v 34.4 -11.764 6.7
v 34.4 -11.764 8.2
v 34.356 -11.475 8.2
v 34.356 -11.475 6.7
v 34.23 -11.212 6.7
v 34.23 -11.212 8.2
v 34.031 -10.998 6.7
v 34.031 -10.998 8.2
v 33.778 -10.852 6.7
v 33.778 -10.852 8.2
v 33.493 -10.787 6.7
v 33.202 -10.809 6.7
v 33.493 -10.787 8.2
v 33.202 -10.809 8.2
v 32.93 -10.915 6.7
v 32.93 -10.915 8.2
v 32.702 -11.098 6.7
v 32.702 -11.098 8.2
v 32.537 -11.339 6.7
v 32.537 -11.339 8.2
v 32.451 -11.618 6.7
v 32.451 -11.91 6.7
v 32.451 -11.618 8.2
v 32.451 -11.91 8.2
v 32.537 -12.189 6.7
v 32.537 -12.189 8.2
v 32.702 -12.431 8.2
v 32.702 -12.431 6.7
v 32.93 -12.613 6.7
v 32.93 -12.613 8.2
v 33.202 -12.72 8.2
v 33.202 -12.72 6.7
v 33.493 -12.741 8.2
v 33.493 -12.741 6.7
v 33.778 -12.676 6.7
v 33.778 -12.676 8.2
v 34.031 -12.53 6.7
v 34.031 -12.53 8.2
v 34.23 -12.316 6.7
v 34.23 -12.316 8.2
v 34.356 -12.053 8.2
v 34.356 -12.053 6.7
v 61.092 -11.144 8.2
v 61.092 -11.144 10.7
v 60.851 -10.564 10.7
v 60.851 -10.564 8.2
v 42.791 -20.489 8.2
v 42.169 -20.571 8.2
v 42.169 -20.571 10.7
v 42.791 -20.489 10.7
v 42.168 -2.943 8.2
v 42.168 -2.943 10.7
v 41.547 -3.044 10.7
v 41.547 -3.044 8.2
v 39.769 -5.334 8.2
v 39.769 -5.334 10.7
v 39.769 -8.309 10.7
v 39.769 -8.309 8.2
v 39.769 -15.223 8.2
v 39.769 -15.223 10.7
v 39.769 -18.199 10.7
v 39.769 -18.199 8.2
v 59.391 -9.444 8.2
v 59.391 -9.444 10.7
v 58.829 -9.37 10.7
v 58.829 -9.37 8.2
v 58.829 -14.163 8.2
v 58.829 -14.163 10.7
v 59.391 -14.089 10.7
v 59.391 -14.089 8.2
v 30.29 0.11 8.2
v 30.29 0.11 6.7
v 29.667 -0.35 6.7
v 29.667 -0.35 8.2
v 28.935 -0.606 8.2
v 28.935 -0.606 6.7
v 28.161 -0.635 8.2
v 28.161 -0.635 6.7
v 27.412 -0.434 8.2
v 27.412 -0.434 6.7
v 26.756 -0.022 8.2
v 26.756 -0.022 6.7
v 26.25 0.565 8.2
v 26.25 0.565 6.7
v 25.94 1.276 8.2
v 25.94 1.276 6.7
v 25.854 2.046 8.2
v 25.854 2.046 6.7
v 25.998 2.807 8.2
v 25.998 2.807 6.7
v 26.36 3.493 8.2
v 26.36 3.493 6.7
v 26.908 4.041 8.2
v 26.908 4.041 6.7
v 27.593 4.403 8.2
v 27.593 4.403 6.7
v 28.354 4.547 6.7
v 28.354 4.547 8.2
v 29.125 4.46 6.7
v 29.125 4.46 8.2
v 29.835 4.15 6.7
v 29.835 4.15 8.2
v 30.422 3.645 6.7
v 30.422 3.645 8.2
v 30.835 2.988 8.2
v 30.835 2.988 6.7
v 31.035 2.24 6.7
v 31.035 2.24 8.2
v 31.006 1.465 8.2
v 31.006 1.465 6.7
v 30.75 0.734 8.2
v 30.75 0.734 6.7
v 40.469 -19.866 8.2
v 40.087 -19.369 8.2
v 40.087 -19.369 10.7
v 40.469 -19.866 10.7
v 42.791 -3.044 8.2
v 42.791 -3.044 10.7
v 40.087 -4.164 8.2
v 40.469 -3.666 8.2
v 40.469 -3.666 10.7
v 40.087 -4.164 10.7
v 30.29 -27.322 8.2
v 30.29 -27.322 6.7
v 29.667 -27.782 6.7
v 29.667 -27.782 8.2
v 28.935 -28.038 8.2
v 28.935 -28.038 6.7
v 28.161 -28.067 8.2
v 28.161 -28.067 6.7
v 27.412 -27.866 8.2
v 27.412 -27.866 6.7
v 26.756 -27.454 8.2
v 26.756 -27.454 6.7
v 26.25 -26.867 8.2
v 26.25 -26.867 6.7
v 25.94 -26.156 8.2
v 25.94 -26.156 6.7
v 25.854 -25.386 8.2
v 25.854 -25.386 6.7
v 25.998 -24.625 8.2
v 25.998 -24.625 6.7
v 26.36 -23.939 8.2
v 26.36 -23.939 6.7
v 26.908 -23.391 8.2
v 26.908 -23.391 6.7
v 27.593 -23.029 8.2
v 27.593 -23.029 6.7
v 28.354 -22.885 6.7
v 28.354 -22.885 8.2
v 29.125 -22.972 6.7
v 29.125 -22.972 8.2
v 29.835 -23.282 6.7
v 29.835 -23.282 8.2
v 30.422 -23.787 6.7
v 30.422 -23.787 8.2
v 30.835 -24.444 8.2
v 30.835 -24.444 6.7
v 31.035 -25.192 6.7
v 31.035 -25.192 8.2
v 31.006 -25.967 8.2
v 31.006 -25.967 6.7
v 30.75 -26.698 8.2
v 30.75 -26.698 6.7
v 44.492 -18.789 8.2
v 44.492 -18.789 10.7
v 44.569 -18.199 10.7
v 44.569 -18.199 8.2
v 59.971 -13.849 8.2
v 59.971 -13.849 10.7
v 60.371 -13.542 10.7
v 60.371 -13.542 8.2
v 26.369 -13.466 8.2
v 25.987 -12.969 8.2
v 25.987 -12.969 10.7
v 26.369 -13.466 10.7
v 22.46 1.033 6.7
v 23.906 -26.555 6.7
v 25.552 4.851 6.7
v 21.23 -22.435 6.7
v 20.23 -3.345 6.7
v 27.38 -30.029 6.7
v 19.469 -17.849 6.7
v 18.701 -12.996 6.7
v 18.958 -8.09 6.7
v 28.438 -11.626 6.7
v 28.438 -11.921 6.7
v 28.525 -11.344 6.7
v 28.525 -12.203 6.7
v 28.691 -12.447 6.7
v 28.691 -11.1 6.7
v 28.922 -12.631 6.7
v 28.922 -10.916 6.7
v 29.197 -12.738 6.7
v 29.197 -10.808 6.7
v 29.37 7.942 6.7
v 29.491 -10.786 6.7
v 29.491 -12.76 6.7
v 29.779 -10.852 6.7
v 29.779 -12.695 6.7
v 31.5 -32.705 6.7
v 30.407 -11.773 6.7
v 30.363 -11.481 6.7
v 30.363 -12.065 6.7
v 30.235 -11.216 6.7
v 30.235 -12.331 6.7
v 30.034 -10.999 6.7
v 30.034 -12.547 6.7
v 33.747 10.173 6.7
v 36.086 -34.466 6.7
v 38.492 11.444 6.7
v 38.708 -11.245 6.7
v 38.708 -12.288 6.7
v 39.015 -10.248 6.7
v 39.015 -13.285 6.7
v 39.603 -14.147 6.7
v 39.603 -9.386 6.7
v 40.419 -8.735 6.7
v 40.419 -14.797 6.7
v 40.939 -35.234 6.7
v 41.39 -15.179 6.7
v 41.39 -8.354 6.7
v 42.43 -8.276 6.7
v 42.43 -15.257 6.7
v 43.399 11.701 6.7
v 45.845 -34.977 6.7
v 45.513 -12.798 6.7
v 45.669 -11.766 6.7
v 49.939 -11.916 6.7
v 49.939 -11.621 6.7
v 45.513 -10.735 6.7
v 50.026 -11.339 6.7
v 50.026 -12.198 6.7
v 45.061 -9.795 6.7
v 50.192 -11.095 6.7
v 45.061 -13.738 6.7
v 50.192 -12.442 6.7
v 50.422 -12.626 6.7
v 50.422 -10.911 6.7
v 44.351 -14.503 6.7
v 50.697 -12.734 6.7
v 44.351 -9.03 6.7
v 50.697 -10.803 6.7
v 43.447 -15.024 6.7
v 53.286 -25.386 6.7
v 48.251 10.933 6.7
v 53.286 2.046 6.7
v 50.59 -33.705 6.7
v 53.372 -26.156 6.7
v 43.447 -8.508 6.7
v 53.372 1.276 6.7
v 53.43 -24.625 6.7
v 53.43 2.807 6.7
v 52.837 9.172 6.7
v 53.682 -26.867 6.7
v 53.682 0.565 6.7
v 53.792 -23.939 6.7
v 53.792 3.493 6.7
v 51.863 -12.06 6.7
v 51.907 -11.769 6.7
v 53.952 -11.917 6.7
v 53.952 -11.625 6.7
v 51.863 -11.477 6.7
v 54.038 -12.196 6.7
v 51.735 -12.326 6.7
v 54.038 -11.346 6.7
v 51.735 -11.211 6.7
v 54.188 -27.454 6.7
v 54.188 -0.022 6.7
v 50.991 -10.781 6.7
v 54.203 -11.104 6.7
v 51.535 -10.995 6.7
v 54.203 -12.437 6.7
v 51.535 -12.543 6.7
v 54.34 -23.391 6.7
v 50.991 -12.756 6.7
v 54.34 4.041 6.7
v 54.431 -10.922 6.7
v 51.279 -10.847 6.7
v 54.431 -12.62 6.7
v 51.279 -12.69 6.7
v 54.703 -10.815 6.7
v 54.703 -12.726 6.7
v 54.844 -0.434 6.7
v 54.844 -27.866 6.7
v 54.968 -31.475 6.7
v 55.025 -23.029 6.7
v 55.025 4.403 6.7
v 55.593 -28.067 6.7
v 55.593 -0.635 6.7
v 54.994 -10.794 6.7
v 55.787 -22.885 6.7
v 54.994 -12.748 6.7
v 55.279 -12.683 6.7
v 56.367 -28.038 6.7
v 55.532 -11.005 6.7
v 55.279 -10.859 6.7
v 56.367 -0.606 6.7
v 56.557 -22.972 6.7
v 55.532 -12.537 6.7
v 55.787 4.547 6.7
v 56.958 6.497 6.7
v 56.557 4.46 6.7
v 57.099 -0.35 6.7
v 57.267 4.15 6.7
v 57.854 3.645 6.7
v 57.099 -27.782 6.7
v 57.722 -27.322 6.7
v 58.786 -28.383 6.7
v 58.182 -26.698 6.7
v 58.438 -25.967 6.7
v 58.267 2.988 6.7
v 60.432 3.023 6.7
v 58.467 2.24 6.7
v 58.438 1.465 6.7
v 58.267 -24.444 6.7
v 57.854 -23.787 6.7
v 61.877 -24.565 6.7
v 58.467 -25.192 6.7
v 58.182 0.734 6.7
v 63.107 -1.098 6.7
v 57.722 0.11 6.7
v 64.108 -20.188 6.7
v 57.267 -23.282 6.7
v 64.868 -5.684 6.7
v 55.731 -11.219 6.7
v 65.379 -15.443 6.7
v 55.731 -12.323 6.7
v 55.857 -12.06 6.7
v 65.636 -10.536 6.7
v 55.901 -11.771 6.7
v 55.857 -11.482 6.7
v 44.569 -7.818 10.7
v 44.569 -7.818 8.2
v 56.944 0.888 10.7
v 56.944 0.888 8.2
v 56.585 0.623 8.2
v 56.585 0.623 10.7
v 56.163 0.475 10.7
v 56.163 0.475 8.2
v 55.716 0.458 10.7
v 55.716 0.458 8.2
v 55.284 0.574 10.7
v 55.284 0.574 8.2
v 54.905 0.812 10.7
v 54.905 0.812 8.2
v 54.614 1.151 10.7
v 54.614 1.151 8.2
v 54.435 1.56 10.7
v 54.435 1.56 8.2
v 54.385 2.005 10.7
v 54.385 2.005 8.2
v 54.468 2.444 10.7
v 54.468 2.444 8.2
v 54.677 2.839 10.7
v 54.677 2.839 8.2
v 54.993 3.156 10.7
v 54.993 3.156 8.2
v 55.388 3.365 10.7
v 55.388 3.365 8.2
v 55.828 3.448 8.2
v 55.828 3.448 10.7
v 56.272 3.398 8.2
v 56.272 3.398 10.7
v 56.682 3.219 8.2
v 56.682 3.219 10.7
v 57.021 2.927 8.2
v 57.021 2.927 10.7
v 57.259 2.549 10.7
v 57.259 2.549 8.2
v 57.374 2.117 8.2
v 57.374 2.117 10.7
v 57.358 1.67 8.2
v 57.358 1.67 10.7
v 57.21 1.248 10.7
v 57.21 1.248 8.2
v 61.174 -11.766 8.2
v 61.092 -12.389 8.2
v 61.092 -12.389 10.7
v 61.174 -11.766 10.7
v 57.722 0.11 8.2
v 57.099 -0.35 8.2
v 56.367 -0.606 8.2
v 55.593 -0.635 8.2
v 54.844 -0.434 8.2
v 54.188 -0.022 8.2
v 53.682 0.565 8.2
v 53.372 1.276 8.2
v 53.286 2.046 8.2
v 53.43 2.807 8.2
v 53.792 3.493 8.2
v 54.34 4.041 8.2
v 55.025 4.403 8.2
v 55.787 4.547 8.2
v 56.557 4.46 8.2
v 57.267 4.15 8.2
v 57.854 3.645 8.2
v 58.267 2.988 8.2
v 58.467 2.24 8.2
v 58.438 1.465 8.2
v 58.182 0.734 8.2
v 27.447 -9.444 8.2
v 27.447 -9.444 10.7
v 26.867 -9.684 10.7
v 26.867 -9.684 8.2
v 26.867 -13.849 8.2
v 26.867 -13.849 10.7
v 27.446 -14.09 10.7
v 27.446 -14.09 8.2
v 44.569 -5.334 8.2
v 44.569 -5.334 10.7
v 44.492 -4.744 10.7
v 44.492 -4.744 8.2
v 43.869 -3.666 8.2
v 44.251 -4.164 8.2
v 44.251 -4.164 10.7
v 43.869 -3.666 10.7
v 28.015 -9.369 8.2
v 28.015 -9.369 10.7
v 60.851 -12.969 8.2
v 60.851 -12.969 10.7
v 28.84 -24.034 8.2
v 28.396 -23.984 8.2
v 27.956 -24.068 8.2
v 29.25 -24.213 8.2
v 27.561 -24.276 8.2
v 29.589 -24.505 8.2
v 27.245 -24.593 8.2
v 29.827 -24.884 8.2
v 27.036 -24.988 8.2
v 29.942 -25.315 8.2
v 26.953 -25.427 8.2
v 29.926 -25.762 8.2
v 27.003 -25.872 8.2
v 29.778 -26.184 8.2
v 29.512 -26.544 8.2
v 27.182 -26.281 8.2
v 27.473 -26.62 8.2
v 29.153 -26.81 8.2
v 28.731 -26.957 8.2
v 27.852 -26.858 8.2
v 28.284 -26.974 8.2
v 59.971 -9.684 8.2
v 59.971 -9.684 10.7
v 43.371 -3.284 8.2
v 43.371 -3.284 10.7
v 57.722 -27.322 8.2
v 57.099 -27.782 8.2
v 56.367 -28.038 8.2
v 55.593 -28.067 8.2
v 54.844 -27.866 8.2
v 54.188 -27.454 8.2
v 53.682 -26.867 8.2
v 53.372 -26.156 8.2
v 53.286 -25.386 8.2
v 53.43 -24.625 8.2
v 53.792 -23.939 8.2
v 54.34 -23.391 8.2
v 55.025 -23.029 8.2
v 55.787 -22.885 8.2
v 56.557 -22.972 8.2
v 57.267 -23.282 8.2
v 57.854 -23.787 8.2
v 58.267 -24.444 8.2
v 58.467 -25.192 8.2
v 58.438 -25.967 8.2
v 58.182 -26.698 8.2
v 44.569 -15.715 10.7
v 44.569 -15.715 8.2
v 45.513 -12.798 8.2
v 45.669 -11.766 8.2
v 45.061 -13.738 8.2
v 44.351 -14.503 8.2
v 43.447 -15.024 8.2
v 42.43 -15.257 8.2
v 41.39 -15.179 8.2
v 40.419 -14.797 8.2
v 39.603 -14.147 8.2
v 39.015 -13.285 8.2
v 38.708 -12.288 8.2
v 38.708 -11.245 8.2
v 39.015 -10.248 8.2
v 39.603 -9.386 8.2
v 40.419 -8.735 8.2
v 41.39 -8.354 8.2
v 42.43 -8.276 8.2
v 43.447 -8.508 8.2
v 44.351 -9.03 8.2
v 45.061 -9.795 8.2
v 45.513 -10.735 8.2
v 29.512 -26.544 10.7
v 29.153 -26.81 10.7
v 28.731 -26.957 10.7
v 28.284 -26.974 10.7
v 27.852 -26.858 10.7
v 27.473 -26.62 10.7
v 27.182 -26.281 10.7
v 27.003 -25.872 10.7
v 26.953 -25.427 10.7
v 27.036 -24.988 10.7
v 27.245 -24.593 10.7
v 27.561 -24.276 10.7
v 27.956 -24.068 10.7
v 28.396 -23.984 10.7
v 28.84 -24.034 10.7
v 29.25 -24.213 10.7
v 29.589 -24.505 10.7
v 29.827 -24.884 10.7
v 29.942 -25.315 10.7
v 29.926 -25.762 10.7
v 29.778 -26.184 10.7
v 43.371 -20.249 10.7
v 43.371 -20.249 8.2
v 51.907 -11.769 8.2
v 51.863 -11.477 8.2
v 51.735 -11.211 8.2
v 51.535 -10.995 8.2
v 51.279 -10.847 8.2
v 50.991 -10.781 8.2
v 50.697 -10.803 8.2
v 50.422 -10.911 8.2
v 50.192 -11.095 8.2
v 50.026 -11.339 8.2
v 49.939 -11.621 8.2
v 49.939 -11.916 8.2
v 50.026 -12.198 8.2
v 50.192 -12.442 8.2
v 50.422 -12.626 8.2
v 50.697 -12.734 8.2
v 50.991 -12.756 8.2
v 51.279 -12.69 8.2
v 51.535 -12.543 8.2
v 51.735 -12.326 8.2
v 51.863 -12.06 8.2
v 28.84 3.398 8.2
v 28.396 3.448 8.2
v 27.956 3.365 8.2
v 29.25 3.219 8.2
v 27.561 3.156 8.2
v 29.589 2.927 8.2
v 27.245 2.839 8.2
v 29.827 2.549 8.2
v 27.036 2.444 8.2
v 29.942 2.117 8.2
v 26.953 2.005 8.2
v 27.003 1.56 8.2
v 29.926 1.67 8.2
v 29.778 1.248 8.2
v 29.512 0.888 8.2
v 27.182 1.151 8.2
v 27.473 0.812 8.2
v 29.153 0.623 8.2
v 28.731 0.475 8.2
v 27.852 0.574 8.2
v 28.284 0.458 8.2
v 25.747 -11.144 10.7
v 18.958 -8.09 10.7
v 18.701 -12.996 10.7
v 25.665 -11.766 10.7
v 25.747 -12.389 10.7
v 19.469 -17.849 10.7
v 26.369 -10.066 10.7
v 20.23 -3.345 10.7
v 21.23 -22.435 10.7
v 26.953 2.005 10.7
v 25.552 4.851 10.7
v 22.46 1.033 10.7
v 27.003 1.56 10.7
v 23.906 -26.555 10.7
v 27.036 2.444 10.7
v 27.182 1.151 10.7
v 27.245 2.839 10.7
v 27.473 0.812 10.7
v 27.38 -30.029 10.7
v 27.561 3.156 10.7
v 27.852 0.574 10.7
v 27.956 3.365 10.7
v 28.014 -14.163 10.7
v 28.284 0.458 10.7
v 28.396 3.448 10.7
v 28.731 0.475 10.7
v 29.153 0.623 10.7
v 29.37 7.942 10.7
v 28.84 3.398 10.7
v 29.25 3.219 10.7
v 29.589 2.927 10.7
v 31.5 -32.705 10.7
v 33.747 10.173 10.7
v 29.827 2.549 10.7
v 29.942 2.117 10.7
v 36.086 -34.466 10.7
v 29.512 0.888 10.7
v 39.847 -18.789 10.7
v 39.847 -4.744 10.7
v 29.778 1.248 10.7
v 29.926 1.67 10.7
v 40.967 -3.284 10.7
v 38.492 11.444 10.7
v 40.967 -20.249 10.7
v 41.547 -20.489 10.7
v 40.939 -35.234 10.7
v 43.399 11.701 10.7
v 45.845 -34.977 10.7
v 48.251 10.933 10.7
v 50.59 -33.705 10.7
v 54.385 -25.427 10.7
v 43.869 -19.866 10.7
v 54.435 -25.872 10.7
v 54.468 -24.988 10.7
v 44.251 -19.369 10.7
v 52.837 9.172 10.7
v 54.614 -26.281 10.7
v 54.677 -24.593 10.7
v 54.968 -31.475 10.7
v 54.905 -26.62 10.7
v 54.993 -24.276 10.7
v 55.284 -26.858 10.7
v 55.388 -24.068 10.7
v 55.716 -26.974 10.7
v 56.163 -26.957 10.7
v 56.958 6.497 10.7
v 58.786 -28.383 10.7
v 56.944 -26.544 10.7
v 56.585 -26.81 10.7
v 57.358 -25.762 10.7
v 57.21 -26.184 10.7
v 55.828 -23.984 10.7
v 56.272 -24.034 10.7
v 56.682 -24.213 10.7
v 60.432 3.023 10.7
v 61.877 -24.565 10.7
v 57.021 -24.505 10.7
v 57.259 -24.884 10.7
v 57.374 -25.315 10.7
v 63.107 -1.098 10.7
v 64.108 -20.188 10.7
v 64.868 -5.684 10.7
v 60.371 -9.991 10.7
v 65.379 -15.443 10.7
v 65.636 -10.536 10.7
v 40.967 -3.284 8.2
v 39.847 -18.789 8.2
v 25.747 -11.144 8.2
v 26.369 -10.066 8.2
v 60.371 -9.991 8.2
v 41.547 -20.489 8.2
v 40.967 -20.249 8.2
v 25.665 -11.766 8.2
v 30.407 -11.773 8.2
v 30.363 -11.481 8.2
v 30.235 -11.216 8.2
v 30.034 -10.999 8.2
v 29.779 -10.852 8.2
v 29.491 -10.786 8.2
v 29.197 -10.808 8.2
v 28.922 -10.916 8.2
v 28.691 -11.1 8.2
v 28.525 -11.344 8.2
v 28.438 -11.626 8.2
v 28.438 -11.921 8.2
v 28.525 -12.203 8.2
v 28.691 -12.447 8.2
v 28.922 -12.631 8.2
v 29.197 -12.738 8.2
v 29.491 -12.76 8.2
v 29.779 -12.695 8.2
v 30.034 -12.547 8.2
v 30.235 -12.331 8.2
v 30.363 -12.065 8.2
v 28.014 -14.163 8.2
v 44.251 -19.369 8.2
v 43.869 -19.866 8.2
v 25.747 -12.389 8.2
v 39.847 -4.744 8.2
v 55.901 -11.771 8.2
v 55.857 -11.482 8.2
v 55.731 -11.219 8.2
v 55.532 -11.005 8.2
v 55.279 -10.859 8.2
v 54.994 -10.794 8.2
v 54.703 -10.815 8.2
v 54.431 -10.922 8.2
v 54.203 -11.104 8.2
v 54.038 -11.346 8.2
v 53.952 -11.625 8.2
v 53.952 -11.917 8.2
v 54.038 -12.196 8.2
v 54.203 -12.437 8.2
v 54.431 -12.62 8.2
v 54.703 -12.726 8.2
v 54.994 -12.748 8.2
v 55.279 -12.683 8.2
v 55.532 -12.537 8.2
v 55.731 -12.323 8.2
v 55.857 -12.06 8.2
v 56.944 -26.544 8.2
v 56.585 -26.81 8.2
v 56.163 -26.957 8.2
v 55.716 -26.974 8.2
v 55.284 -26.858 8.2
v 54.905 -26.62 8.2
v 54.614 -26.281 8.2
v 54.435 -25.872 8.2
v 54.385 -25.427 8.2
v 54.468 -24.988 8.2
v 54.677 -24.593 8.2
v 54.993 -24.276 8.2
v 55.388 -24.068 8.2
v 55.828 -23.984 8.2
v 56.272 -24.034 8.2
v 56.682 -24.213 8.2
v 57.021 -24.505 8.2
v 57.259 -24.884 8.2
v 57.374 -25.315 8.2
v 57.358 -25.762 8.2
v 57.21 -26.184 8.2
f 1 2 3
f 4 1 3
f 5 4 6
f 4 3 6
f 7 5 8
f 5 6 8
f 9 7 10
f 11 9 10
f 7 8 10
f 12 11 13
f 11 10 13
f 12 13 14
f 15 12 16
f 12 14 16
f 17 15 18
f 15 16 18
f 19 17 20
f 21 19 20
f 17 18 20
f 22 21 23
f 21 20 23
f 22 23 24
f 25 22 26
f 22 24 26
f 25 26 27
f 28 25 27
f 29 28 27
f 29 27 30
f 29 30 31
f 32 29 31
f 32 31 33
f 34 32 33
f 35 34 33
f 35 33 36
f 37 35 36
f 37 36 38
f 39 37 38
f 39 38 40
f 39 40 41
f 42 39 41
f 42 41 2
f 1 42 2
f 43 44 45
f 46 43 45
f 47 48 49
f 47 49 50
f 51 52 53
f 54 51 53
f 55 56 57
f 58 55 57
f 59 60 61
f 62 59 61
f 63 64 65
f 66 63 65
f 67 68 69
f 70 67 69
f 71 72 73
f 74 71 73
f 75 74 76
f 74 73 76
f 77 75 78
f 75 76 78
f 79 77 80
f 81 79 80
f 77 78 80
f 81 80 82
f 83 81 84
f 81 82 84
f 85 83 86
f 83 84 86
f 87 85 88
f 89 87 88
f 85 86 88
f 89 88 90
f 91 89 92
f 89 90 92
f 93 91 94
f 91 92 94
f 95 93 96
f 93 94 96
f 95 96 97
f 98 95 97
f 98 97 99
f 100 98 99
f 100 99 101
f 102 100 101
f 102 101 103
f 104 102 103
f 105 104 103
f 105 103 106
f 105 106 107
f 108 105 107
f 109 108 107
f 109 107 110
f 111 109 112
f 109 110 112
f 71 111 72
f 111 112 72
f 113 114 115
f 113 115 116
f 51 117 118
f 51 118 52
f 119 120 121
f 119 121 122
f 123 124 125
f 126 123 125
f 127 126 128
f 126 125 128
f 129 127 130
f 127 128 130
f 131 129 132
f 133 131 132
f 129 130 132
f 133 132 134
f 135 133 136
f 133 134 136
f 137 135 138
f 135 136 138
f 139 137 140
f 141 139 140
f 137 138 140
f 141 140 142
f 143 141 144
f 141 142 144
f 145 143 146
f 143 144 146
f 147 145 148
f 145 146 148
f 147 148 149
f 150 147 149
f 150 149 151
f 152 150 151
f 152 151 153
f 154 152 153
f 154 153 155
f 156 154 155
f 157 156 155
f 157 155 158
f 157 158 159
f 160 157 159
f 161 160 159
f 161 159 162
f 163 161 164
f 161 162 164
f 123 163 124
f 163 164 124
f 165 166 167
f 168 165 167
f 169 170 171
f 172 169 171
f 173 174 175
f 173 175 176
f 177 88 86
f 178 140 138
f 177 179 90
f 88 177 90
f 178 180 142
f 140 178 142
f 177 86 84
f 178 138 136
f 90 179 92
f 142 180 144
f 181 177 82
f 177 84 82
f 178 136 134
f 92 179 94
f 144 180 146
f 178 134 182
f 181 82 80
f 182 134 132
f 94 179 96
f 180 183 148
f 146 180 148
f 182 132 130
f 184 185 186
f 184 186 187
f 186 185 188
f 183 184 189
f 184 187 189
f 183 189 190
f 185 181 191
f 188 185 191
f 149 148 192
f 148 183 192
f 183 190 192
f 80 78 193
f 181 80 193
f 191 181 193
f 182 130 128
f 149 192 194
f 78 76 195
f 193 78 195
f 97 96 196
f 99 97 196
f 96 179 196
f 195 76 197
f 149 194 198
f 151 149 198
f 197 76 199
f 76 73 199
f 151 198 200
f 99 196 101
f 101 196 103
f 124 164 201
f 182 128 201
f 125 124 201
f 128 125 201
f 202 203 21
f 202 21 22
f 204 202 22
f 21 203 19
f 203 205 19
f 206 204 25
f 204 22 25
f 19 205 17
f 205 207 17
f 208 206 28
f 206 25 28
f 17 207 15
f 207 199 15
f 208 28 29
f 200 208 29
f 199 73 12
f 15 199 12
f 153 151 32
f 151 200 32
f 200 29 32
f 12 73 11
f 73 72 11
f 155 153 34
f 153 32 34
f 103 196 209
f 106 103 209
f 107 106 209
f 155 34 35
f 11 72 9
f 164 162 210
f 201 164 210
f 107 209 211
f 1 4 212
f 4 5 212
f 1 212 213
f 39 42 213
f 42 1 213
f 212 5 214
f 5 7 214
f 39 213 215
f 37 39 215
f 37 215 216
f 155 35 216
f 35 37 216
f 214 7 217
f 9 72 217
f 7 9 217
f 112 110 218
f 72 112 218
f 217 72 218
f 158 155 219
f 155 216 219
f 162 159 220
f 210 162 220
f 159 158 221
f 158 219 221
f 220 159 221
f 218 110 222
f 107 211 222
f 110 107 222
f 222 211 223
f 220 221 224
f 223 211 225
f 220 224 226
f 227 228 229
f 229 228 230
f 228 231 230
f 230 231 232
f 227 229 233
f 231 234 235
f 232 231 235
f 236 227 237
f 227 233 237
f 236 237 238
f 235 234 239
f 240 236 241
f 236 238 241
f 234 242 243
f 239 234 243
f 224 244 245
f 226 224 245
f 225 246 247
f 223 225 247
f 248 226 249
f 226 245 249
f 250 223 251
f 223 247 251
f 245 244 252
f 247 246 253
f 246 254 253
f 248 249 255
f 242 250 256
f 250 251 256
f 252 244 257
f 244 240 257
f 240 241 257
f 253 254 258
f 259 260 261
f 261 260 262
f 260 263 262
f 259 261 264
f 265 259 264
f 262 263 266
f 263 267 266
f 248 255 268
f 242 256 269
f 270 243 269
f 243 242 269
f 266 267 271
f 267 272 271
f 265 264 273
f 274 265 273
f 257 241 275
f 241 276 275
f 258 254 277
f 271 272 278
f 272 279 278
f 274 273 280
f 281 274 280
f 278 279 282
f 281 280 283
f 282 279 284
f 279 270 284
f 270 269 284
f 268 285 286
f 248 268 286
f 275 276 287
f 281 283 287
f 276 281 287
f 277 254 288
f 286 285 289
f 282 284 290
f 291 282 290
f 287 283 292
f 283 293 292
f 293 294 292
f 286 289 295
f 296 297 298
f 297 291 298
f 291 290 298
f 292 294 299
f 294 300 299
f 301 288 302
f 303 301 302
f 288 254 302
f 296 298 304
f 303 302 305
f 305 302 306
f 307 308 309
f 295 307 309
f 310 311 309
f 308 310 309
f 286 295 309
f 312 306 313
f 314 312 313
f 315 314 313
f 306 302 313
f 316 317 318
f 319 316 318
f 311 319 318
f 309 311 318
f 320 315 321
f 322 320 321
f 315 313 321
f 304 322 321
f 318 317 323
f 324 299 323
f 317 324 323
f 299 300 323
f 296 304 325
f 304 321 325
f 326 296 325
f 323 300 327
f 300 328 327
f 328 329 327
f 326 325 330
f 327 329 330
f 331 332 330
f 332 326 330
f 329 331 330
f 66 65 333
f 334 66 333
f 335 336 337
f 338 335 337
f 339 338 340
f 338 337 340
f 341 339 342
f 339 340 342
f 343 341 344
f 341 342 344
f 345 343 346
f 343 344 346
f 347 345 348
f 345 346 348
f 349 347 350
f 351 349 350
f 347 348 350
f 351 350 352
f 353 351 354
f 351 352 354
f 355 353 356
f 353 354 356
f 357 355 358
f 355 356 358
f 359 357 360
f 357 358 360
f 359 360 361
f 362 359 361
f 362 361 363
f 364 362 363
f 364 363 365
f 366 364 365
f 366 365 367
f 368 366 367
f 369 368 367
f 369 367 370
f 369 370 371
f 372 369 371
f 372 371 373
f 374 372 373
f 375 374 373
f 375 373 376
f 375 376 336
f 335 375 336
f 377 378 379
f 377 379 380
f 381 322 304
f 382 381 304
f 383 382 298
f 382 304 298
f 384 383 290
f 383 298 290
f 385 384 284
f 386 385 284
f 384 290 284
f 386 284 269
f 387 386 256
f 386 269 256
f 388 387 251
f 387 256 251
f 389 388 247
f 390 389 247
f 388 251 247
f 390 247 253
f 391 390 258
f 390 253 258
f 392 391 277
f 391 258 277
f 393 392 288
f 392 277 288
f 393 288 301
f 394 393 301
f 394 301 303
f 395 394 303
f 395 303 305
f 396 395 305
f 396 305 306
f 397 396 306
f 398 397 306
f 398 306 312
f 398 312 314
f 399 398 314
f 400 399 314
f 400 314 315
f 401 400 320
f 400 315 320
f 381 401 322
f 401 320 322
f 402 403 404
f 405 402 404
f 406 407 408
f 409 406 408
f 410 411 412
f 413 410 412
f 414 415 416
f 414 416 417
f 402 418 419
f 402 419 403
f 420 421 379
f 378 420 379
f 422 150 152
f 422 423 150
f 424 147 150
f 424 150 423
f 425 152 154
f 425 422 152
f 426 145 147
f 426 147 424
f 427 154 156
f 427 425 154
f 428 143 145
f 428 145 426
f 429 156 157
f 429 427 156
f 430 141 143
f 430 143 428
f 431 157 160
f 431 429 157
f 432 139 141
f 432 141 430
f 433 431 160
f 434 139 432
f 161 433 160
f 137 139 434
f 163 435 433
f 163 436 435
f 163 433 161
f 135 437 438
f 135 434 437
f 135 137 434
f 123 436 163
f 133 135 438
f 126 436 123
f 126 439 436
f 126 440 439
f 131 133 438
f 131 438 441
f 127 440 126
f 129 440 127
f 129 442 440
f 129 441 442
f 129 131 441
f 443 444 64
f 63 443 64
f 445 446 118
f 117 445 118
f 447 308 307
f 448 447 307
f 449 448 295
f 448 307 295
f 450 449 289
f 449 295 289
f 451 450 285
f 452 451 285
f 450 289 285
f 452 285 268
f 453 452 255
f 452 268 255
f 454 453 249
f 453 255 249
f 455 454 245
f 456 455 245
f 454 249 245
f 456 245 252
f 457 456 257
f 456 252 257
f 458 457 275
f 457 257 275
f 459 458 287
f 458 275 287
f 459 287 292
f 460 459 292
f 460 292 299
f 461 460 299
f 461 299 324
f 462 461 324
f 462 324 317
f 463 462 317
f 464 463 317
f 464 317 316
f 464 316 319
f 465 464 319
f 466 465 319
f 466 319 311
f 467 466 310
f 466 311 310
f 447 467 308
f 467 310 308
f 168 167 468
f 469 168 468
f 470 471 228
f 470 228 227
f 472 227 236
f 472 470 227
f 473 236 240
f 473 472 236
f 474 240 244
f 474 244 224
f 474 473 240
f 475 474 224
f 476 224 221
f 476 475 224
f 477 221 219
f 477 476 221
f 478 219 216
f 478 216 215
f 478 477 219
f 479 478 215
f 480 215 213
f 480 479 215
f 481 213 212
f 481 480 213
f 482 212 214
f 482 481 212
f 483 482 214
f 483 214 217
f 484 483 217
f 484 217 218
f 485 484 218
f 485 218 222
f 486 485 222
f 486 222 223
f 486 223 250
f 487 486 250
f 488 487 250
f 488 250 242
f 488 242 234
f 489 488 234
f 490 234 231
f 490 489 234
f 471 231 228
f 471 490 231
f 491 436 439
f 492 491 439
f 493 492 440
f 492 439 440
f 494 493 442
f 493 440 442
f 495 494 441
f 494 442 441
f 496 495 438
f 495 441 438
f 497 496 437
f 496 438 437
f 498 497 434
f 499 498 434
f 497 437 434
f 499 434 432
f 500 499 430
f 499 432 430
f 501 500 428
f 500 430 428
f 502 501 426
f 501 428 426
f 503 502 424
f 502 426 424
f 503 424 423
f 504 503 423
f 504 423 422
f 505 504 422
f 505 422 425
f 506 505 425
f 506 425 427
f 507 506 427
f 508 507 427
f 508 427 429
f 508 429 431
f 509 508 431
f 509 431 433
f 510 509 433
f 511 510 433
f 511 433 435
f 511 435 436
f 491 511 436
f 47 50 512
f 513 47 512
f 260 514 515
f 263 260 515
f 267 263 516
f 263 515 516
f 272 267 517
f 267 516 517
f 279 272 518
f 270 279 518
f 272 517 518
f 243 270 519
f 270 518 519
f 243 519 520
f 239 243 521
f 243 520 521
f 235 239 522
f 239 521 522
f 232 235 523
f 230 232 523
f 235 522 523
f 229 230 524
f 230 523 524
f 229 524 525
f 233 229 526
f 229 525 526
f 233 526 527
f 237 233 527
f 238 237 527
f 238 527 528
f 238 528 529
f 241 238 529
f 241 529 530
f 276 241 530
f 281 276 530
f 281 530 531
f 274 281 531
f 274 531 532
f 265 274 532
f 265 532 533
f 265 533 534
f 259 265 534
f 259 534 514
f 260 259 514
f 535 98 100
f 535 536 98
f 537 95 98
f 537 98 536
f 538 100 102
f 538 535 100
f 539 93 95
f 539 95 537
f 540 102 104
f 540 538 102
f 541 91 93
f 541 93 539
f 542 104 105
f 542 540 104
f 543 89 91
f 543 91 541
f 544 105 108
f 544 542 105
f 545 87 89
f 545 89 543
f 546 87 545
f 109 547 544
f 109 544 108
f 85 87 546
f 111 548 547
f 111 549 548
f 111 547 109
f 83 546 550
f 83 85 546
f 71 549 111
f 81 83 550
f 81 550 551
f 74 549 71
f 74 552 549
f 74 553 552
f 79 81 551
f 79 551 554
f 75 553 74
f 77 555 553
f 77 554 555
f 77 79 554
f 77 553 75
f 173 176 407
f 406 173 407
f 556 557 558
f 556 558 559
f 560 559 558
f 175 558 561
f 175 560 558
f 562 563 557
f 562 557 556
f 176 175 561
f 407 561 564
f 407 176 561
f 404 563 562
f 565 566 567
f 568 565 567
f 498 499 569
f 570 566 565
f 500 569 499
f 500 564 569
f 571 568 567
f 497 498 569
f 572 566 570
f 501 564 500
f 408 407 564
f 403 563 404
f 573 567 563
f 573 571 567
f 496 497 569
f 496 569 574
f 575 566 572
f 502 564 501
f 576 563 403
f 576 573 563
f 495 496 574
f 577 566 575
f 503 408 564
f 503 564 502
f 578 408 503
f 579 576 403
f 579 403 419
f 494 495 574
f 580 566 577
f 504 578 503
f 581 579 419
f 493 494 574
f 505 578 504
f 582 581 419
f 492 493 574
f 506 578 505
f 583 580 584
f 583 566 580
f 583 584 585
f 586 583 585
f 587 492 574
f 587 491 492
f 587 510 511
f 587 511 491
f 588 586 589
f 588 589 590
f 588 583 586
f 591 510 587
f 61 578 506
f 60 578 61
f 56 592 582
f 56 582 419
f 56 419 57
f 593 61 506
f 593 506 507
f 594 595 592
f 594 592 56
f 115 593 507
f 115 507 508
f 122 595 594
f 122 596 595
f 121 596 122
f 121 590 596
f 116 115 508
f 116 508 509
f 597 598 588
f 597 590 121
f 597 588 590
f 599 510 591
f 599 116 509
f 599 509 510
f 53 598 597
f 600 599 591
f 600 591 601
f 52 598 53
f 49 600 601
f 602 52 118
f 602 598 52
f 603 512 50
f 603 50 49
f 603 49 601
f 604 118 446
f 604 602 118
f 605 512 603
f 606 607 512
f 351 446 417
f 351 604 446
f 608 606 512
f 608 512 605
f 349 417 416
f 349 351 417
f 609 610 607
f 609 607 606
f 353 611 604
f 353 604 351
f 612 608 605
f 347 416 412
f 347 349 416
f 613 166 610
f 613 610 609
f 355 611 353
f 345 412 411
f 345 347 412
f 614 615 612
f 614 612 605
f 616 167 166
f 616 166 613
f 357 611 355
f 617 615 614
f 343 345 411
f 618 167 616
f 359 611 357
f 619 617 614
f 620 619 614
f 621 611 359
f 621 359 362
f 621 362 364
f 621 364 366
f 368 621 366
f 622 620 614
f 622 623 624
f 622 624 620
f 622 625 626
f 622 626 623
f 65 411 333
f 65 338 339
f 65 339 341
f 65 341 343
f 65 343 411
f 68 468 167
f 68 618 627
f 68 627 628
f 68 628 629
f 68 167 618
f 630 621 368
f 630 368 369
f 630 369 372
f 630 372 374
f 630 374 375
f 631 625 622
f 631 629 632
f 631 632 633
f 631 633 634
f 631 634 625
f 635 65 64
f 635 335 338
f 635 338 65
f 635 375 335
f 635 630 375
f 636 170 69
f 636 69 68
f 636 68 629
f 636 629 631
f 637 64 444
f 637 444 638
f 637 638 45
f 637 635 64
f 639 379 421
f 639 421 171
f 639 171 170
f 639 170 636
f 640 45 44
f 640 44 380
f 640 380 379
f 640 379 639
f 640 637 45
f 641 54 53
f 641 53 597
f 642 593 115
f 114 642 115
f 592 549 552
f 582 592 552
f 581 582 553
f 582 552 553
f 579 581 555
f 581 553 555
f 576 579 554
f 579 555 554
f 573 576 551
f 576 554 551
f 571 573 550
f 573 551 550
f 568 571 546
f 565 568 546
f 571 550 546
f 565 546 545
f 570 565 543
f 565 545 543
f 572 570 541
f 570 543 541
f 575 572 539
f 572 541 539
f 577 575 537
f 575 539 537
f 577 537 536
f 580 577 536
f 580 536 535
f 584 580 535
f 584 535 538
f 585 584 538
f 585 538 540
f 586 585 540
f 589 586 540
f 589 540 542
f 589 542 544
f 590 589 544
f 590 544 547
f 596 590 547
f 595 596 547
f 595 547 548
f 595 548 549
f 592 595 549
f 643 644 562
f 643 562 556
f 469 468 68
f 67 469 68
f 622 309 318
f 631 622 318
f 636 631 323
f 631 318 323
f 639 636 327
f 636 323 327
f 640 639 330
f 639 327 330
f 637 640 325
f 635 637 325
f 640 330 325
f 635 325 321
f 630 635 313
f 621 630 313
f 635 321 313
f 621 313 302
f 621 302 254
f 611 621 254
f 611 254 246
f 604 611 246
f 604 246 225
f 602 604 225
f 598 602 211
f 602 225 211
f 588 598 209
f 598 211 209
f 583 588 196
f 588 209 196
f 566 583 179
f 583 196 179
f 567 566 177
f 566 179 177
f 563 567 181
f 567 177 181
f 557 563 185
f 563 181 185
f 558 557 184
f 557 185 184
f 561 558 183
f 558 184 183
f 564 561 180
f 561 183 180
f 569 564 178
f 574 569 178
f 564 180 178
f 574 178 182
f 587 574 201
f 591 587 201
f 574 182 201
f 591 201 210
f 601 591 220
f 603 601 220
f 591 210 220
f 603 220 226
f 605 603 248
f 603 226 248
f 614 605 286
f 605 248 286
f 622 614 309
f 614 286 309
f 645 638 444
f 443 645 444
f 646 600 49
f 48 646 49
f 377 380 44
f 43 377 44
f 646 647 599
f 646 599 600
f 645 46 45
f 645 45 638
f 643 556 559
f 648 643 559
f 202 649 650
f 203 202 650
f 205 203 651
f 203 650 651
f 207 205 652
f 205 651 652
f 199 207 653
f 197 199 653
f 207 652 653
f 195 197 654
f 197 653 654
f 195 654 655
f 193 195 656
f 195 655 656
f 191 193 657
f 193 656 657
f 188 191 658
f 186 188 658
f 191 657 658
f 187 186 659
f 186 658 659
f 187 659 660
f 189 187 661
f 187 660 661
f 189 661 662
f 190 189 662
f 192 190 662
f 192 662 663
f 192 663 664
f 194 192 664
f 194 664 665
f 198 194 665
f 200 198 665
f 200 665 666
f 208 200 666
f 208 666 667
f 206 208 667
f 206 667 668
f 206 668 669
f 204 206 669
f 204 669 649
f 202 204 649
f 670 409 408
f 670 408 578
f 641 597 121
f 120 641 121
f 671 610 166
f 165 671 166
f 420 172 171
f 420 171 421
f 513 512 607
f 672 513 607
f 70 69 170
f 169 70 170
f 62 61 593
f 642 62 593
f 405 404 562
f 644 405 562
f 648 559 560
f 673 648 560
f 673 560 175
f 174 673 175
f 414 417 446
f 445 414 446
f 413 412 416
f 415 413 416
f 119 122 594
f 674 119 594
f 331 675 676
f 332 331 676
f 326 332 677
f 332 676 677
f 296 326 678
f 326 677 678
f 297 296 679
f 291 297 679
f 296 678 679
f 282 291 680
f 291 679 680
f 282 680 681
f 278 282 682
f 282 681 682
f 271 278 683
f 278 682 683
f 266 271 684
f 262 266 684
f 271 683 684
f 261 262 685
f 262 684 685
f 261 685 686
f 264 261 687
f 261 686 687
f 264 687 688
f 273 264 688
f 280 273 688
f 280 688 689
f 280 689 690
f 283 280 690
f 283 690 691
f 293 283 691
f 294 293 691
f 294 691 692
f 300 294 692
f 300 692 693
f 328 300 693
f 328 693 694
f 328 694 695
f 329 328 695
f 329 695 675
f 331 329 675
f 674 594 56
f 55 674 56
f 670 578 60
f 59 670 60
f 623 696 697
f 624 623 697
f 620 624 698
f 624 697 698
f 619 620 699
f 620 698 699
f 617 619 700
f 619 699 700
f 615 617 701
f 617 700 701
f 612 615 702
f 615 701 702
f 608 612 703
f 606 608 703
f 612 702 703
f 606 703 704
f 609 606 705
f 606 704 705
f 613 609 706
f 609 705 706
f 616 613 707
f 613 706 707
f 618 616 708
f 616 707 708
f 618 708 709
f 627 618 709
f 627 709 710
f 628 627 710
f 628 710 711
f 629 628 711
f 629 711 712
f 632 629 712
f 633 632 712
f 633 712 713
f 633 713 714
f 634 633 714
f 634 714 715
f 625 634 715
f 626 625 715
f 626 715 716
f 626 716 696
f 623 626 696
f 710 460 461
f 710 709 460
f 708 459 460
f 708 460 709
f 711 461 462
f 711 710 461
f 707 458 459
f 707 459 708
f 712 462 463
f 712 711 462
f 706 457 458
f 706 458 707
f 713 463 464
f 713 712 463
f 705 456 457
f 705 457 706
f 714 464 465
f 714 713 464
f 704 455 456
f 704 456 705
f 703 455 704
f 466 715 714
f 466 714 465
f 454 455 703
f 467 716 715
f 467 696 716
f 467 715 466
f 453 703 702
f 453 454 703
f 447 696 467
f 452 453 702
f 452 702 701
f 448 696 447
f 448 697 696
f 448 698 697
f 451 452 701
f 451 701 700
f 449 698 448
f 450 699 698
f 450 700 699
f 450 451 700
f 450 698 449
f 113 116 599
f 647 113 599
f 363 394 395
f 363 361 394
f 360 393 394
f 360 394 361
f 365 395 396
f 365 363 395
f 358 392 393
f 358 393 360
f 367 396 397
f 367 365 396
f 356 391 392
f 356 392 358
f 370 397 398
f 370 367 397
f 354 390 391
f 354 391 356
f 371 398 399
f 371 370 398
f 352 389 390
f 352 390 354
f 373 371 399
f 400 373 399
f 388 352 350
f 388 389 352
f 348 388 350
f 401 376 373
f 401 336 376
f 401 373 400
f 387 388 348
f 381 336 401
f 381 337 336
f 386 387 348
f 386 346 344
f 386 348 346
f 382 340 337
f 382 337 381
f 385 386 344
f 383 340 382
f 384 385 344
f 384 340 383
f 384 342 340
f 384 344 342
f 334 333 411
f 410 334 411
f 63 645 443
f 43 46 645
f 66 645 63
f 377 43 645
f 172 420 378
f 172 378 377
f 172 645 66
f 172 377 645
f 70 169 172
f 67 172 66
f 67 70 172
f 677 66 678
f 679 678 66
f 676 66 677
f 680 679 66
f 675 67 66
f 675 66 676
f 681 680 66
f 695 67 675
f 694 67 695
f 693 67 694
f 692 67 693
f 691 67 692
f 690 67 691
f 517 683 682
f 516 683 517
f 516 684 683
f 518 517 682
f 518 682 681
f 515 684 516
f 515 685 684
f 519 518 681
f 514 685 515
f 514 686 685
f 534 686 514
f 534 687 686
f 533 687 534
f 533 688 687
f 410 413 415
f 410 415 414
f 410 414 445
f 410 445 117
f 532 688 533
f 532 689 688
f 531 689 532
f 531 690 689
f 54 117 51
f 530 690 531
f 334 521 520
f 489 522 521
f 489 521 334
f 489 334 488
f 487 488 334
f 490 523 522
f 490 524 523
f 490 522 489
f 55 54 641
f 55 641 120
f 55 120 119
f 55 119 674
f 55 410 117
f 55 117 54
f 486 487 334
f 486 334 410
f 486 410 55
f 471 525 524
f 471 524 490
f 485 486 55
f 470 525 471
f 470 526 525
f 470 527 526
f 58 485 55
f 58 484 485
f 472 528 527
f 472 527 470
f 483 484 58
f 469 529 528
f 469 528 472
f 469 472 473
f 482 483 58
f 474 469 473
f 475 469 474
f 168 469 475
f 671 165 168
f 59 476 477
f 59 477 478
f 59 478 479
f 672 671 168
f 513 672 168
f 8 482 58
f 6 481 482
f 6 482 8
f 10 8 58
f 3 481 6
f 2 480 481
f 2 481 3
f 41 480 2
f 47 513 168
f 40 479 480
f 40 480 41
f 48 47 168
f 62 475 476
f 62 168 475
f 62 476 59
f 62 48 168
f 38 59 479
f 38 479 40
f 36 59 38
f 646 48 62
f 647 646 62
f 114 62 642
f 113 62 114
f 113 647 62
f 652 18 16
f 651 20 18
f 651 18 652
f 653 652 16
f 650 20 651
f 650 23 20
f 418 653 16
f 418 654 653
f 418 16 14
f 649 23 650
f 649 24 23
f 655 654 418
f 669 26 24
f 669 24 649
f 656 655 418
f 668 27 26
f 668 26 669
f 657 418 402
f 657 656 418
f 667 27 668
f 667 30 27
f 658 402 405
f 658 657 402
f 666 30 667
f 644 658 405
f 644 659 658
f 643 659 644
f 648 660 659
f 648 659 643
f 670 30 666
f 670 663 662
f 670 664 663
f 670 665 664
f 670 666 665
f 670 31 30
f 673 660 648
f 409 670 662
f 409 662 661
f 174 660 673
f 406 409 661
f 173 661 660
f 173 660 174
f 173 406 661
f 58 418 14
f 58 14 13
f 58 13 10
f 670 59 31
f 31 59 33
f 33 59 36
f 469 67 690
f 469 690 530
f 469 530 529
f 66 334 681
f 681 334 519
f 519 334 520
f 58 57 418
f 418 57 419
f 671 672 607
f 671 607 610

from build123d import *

# Parameters (mm, degrees)
CIRCLE001_R            = 0.99
EXTRUDE060_DEPTH       = 4
CIRCLE002_R            = 0.98
EXTRUDE059_DEPTH       = 4
CIRCLE003_R            = 0.99
EXTRUDE058_DEPTH       = 4
CIRCLE004_R            = 0.98
EXTRUDE057_DEPTH       = 4
CIRCLE051_R            = 3.5
EXTRUDE056_DEPTH       = 1.5
EXTRUDE055_DEPTH       = 2.5
CIRCLE049_R            = 2.6
EXTRUDE052_DEPTH       = 1.5
CIRCLE048_R            = 2.6
EXTRUDE051_DEPTH       = 1.5
CIRCLE047_R            = 2.6
EXTRUDE050_DEPTH       = 1.5
CIRCLE050_R            = 2.6
EXTRUDE049_DEPTH       = 1.5
CIRCLE045_R            = 1.5
EXTRUDE045_DEPTH       = 4
CIRCLE043_R            = 1.5
EXTRUDE046_DEPTH       = 4
CIRCLE046_R            = 1.5
EXTRUDE047_DEPTH       = 4
CIRCLE044_R            = 1.5
EXTRUDE048_DEPTH       = 4
CIRCLE040_R            = 23.5
EXTRUDE044_DEPTH       = 4
CUT015_PLACEMENT_ANGLE = 45
CUT018_PLACEMENT_ANGLE = 180


with BuildPart() as extrude060:
    # Circle001 → Extrude060 (new body)
    with BuildSketch(Plane(origin=(100.138196, 1.761986, -7), x_dir=(1, 0, 0), z_dir=(0, 0, -1))):
        Circle(CIRCLE001_R)
    extrude(amount=-EXTRUDE060_DEPTH)


with BuildPart() as extrude059:
    # Circle002 (on Circle) → Extrude059 (new body)
    with BuildSketch(Plane(origin=(104.140973, 1.752854, -7), x_dir=(1, 0, 0), z_dir=(0, 0, -1))):
        Circle(CIRCLE002_R)
    extrude(amount=-EXTRUDE059_DEPTH)


with BuildPart() as extrude058:
    # Circle003 (on Circle) → Extrude058 (new body)
    with BuildSketch(Plane(origin=(121.638501, 1.757256, -7), x_dir=(1, 0, 0), z_dir=(0, 0, -1))):
        Circle(CIRCLE003_R)
    extrude(amount=-EXTRUDE058_DEPTH)


with BuildPart() as extrude057:
    # Circle004 → Extrude057 (new body)
    with BuildSketch(Plane(origin=(125.641919, 1.759529, -7), x_dir=(1, 0, 0), z_dir=(0, 0, -1))):
        Circle(CIRCLE004_R)
    extrude(amount=-EXTRUDE057_DEPTH)


with BuildPart() as extrude056:
    # Circle051 → Extrude056 (new body)
    with BuildSketch(Plane(origin=(115.082764, -1.512482, 32.5), x_dir=(1, 0, 0), z_dir=(0, 0, 1))):
        Circle(CIRCLE051_R)
    extrude(amount=EXTRUDE056_DEPTH)


with BuildPart() as fusion016:
    # Wire001 → Extrude055 (new body)
    with BuildSketch(Plane(origin=(418.588715, 55.5117, 32.5), x_dir=(1, 0, 0), z_dir=(0, 0, 1))):
        Polygon((0, 0), (-11.754715, 1.0599), (-12.322327, 1.134499), (-12.902222, 1.374699), (-13.400116, 1.756802), (-14.0224, 2.834702), (-14.104401, 3.456902), (-14.0224, 4.079201), (-13.782227, 4.6591), (-13.400116, 5.157001), (-12.902283, 5.539154), (-12.322998, 5.780178), (-11.755127, 5.854), (0, 6.913898), (0, 9.889698), (0.077576, 10.479198), (0.31778, 11.059101), (0.69989, 11.557003), (1.197784, 11.939098), (1.777679, 12.179302), (2.399994, 12.261303), (3.022186, 12.179302), (3.602081, 11.939098), (4.100098, 11.557003), (4.482178, 11.059101), (4.722382, 10.479198), (4.799988, 9.889698), (4.799988, 7.405499), (19.059692, 5.853401), (19.622192, 5.779301), (20.202087, 5.539101), (20.601379, 5.2327), (21.082184, 4.6591), (21.322388, 4.079201), (21.404297, 3.456902), (21.322388, 2.834702), (21.082184, 2.254799), (20.601379, 1.681099), (20.202087, 1.374699), (19.622192, 1.134499), (19.059692, 1.060501), (4.799988, -0.4916), (4.799988, -2.9758), (4.722382, -3.5653), (4.482178, -4.145199), (4.100098, -4.6432), (3.602081, -5.025299), (3.022186, -5.265499), (2.398834, -5.366161), (1.777679, -5.265499), (1.197784, -5.025299), (0.69989, -4.6432), (0.31778, -4.145199), (0.077576, -3.5653), (0, -2.9758), align=None)
    extrude(amount=EXTRUDE055_DEPTH)


with BuildPart() as fusion016_1:
    # Extrude055 placement: moved
    add(fusion016.part.moved(Location((-305.905368, -60.481077, -2.5))))

    # Fusion015: union Extrude056
    add(extrude056.part)


with BuildPart() as fusion016_2:
    # Fusion015 placement: moved
    add(fusion016_1.part.moved(Location((-2.193024, 3.267531, -37))))

    # Fusion016: union Extrude060, Extrude059, Extrude058, Extrude057
    add(extrude060.part)
    add(extrude059.part)
    add(extrude058.part)
    add(extrude057.part)


with BuildPart() as fusion016_3:
    # Fusion016 placement: moved
    add(fusion016_2.part.moved(Location((-42.889772, -1.655092, 0))))


with BuildPart() as extrude052:
    # Circle049 → Extrude052 (new body)
    with BuildSketch(Plane(origin=(70, -19.29598, -3), x_dir=(1, 0, 0), z_dir=(0, 0, 1))):
        Circle(CIRCLE049_R)
    extrude(amount=-EXTRUDE052_DEPTH)


with BuildPart() as extrude051:
    # Circle048 → Extrude051 (new body)
    with BuildSketch(Plane(origin=(89.397382, 0.101403, -3), x_dir=(1, 0, 0), z_dir=(0, 0, 1))):
        Circle(CIRCLE048_R)
    extrude(amount=-EXTRUDE051_DEPTH)


with BuildPart() as extrude050:
    # Circle047 (on Cut) → Extrude050 (new body)
    with BuildSketch(Plane(origin=(70, 19.498785, -3), x_dir=(1, 0, 0), z_dir=(0, 0, 1))):
        Circle(CIRCLE047_R)
    extrude(amount=-EXTRUDE050_DEPTH)


with BuildPart() as extrude049:
    # Circle050 → Extrude049 (new body)
    with BuildSketch(Plane(origin=(50.602618, 0.101403, -3), x_dir=(1, 0, 0), z_dir=(0, 0, 1))):
        Circle(CIRCLE050_R)
    extrude(amount=-EXTRUDE049_DEPTH)


with BuildPart() as extrude045:
    # Circle045 → Extrude045 (new body)
    with BuildSketch(Plane(origin=(50.602618, 0.101403, -3), x_dir=(1, 0, 0), z_dir=(0, 0, 1))):
        Circle(CIRCLE045_R)
    extrude(amount=-EXTRUDE045_DEPTH)


with BuildPart() as extrude046:
    # Circle043 → Extrude046 (new body)
    with BuildSketch(Plane(origin=(70, 19.498785, -3), x_dir=(1, 0, 0), z_dir=(0, 0, 1))):
        Circle(CIRCLE043_R)
    extrude(amount=-EXTRUDE046_DEPTH)


with BuildPart() as extrude047:
    # Circle046 → Extrude047 (new body)
    with BuildSketch(Plane(origin=(89.397382, 0.101403, -3), x_dir=(1, 0, 0), z_dir=(0, 0, 1))):
        Circle(CIRCLE046_R)
    extrude(amount=-EXTRUDE047_DEPTH)


with BuildPart() as extrude048:
    # Circle044 → Extrude048 (new body)
    with BuildSketch(Plane(origin=(70, -19.29598, -3), x_dir=(1, 0, 0), z_dir=(0, 0, 1))):
        Circle(CIRCLE044_R)
    extrude(amount=-EXTRUDE048_DEPTH)


with BuildPart() as cut0_disk:
    # Circle040 (on Fusion) → Extrude044 (new body)
    with BuildSketch(Plane(origin=(70, 0.1, -3), x_dir=(1, 0, 0), z_dir=(0, 0, -1))):
        Circle(CIRCLE040_R)
    extrude(amount=EXTRUDE044_DEPTH)

    # Cut008: cut Extrude048
    add(extrude048.part, mode=Mode.SUBTRACT)

    # Cut009: cut Extrude047
    add(extrude047.part, mode=Mode.SUBTRACT)

    # Cut010: cut Extrude046
    add(extrude046.part, mode=Mode.SUBTRACT)

    # Cut011: cut Extrude045
    add(extrude045.part, mode=Mode.SUBTRACT)

    # Cut012: cut Extrude049
    add(extrude049.part, mode=Mode.SUBTRACT)

    # Cut013: cut Extrude050
    add(extrude050.part, mode=Mode.SUBTRACT)

    # Cut014: cut Extrude051
    add(extrude051.part, mode=Mode.SUBTRACT)

    # Cut015: cut Extrude052
    add(extrude052.part, mode=Mode.SUBTRACT)


with BuildPart() as cut0_disk_1:
    # Cut015 placement: moved
    add(cut0_disk.part.moved(Location((20.573185, -49.468206, 0))).rotate(Axis((20.573185, -49.468206, 0), (0, 0, 1)), CUT015_PLACEMENT_ANGLE))

    # Cut018: cut Fusion016
    add(fusion016_3.part, mode=Mode.SUBTRACT)


with BuildPart() as cut0_disk_2:
    # Cut018 placement: moved
    add(cut0_disk_1.part.moved(Location((-27.831247, -11.66637, 3.7))).rotate(Axis((-27.831247, -11.66637, 3.7), (1, 0, 0)), CUT018_PLACEMENT_ANGLE))


solid = cut0_disk_2.part
